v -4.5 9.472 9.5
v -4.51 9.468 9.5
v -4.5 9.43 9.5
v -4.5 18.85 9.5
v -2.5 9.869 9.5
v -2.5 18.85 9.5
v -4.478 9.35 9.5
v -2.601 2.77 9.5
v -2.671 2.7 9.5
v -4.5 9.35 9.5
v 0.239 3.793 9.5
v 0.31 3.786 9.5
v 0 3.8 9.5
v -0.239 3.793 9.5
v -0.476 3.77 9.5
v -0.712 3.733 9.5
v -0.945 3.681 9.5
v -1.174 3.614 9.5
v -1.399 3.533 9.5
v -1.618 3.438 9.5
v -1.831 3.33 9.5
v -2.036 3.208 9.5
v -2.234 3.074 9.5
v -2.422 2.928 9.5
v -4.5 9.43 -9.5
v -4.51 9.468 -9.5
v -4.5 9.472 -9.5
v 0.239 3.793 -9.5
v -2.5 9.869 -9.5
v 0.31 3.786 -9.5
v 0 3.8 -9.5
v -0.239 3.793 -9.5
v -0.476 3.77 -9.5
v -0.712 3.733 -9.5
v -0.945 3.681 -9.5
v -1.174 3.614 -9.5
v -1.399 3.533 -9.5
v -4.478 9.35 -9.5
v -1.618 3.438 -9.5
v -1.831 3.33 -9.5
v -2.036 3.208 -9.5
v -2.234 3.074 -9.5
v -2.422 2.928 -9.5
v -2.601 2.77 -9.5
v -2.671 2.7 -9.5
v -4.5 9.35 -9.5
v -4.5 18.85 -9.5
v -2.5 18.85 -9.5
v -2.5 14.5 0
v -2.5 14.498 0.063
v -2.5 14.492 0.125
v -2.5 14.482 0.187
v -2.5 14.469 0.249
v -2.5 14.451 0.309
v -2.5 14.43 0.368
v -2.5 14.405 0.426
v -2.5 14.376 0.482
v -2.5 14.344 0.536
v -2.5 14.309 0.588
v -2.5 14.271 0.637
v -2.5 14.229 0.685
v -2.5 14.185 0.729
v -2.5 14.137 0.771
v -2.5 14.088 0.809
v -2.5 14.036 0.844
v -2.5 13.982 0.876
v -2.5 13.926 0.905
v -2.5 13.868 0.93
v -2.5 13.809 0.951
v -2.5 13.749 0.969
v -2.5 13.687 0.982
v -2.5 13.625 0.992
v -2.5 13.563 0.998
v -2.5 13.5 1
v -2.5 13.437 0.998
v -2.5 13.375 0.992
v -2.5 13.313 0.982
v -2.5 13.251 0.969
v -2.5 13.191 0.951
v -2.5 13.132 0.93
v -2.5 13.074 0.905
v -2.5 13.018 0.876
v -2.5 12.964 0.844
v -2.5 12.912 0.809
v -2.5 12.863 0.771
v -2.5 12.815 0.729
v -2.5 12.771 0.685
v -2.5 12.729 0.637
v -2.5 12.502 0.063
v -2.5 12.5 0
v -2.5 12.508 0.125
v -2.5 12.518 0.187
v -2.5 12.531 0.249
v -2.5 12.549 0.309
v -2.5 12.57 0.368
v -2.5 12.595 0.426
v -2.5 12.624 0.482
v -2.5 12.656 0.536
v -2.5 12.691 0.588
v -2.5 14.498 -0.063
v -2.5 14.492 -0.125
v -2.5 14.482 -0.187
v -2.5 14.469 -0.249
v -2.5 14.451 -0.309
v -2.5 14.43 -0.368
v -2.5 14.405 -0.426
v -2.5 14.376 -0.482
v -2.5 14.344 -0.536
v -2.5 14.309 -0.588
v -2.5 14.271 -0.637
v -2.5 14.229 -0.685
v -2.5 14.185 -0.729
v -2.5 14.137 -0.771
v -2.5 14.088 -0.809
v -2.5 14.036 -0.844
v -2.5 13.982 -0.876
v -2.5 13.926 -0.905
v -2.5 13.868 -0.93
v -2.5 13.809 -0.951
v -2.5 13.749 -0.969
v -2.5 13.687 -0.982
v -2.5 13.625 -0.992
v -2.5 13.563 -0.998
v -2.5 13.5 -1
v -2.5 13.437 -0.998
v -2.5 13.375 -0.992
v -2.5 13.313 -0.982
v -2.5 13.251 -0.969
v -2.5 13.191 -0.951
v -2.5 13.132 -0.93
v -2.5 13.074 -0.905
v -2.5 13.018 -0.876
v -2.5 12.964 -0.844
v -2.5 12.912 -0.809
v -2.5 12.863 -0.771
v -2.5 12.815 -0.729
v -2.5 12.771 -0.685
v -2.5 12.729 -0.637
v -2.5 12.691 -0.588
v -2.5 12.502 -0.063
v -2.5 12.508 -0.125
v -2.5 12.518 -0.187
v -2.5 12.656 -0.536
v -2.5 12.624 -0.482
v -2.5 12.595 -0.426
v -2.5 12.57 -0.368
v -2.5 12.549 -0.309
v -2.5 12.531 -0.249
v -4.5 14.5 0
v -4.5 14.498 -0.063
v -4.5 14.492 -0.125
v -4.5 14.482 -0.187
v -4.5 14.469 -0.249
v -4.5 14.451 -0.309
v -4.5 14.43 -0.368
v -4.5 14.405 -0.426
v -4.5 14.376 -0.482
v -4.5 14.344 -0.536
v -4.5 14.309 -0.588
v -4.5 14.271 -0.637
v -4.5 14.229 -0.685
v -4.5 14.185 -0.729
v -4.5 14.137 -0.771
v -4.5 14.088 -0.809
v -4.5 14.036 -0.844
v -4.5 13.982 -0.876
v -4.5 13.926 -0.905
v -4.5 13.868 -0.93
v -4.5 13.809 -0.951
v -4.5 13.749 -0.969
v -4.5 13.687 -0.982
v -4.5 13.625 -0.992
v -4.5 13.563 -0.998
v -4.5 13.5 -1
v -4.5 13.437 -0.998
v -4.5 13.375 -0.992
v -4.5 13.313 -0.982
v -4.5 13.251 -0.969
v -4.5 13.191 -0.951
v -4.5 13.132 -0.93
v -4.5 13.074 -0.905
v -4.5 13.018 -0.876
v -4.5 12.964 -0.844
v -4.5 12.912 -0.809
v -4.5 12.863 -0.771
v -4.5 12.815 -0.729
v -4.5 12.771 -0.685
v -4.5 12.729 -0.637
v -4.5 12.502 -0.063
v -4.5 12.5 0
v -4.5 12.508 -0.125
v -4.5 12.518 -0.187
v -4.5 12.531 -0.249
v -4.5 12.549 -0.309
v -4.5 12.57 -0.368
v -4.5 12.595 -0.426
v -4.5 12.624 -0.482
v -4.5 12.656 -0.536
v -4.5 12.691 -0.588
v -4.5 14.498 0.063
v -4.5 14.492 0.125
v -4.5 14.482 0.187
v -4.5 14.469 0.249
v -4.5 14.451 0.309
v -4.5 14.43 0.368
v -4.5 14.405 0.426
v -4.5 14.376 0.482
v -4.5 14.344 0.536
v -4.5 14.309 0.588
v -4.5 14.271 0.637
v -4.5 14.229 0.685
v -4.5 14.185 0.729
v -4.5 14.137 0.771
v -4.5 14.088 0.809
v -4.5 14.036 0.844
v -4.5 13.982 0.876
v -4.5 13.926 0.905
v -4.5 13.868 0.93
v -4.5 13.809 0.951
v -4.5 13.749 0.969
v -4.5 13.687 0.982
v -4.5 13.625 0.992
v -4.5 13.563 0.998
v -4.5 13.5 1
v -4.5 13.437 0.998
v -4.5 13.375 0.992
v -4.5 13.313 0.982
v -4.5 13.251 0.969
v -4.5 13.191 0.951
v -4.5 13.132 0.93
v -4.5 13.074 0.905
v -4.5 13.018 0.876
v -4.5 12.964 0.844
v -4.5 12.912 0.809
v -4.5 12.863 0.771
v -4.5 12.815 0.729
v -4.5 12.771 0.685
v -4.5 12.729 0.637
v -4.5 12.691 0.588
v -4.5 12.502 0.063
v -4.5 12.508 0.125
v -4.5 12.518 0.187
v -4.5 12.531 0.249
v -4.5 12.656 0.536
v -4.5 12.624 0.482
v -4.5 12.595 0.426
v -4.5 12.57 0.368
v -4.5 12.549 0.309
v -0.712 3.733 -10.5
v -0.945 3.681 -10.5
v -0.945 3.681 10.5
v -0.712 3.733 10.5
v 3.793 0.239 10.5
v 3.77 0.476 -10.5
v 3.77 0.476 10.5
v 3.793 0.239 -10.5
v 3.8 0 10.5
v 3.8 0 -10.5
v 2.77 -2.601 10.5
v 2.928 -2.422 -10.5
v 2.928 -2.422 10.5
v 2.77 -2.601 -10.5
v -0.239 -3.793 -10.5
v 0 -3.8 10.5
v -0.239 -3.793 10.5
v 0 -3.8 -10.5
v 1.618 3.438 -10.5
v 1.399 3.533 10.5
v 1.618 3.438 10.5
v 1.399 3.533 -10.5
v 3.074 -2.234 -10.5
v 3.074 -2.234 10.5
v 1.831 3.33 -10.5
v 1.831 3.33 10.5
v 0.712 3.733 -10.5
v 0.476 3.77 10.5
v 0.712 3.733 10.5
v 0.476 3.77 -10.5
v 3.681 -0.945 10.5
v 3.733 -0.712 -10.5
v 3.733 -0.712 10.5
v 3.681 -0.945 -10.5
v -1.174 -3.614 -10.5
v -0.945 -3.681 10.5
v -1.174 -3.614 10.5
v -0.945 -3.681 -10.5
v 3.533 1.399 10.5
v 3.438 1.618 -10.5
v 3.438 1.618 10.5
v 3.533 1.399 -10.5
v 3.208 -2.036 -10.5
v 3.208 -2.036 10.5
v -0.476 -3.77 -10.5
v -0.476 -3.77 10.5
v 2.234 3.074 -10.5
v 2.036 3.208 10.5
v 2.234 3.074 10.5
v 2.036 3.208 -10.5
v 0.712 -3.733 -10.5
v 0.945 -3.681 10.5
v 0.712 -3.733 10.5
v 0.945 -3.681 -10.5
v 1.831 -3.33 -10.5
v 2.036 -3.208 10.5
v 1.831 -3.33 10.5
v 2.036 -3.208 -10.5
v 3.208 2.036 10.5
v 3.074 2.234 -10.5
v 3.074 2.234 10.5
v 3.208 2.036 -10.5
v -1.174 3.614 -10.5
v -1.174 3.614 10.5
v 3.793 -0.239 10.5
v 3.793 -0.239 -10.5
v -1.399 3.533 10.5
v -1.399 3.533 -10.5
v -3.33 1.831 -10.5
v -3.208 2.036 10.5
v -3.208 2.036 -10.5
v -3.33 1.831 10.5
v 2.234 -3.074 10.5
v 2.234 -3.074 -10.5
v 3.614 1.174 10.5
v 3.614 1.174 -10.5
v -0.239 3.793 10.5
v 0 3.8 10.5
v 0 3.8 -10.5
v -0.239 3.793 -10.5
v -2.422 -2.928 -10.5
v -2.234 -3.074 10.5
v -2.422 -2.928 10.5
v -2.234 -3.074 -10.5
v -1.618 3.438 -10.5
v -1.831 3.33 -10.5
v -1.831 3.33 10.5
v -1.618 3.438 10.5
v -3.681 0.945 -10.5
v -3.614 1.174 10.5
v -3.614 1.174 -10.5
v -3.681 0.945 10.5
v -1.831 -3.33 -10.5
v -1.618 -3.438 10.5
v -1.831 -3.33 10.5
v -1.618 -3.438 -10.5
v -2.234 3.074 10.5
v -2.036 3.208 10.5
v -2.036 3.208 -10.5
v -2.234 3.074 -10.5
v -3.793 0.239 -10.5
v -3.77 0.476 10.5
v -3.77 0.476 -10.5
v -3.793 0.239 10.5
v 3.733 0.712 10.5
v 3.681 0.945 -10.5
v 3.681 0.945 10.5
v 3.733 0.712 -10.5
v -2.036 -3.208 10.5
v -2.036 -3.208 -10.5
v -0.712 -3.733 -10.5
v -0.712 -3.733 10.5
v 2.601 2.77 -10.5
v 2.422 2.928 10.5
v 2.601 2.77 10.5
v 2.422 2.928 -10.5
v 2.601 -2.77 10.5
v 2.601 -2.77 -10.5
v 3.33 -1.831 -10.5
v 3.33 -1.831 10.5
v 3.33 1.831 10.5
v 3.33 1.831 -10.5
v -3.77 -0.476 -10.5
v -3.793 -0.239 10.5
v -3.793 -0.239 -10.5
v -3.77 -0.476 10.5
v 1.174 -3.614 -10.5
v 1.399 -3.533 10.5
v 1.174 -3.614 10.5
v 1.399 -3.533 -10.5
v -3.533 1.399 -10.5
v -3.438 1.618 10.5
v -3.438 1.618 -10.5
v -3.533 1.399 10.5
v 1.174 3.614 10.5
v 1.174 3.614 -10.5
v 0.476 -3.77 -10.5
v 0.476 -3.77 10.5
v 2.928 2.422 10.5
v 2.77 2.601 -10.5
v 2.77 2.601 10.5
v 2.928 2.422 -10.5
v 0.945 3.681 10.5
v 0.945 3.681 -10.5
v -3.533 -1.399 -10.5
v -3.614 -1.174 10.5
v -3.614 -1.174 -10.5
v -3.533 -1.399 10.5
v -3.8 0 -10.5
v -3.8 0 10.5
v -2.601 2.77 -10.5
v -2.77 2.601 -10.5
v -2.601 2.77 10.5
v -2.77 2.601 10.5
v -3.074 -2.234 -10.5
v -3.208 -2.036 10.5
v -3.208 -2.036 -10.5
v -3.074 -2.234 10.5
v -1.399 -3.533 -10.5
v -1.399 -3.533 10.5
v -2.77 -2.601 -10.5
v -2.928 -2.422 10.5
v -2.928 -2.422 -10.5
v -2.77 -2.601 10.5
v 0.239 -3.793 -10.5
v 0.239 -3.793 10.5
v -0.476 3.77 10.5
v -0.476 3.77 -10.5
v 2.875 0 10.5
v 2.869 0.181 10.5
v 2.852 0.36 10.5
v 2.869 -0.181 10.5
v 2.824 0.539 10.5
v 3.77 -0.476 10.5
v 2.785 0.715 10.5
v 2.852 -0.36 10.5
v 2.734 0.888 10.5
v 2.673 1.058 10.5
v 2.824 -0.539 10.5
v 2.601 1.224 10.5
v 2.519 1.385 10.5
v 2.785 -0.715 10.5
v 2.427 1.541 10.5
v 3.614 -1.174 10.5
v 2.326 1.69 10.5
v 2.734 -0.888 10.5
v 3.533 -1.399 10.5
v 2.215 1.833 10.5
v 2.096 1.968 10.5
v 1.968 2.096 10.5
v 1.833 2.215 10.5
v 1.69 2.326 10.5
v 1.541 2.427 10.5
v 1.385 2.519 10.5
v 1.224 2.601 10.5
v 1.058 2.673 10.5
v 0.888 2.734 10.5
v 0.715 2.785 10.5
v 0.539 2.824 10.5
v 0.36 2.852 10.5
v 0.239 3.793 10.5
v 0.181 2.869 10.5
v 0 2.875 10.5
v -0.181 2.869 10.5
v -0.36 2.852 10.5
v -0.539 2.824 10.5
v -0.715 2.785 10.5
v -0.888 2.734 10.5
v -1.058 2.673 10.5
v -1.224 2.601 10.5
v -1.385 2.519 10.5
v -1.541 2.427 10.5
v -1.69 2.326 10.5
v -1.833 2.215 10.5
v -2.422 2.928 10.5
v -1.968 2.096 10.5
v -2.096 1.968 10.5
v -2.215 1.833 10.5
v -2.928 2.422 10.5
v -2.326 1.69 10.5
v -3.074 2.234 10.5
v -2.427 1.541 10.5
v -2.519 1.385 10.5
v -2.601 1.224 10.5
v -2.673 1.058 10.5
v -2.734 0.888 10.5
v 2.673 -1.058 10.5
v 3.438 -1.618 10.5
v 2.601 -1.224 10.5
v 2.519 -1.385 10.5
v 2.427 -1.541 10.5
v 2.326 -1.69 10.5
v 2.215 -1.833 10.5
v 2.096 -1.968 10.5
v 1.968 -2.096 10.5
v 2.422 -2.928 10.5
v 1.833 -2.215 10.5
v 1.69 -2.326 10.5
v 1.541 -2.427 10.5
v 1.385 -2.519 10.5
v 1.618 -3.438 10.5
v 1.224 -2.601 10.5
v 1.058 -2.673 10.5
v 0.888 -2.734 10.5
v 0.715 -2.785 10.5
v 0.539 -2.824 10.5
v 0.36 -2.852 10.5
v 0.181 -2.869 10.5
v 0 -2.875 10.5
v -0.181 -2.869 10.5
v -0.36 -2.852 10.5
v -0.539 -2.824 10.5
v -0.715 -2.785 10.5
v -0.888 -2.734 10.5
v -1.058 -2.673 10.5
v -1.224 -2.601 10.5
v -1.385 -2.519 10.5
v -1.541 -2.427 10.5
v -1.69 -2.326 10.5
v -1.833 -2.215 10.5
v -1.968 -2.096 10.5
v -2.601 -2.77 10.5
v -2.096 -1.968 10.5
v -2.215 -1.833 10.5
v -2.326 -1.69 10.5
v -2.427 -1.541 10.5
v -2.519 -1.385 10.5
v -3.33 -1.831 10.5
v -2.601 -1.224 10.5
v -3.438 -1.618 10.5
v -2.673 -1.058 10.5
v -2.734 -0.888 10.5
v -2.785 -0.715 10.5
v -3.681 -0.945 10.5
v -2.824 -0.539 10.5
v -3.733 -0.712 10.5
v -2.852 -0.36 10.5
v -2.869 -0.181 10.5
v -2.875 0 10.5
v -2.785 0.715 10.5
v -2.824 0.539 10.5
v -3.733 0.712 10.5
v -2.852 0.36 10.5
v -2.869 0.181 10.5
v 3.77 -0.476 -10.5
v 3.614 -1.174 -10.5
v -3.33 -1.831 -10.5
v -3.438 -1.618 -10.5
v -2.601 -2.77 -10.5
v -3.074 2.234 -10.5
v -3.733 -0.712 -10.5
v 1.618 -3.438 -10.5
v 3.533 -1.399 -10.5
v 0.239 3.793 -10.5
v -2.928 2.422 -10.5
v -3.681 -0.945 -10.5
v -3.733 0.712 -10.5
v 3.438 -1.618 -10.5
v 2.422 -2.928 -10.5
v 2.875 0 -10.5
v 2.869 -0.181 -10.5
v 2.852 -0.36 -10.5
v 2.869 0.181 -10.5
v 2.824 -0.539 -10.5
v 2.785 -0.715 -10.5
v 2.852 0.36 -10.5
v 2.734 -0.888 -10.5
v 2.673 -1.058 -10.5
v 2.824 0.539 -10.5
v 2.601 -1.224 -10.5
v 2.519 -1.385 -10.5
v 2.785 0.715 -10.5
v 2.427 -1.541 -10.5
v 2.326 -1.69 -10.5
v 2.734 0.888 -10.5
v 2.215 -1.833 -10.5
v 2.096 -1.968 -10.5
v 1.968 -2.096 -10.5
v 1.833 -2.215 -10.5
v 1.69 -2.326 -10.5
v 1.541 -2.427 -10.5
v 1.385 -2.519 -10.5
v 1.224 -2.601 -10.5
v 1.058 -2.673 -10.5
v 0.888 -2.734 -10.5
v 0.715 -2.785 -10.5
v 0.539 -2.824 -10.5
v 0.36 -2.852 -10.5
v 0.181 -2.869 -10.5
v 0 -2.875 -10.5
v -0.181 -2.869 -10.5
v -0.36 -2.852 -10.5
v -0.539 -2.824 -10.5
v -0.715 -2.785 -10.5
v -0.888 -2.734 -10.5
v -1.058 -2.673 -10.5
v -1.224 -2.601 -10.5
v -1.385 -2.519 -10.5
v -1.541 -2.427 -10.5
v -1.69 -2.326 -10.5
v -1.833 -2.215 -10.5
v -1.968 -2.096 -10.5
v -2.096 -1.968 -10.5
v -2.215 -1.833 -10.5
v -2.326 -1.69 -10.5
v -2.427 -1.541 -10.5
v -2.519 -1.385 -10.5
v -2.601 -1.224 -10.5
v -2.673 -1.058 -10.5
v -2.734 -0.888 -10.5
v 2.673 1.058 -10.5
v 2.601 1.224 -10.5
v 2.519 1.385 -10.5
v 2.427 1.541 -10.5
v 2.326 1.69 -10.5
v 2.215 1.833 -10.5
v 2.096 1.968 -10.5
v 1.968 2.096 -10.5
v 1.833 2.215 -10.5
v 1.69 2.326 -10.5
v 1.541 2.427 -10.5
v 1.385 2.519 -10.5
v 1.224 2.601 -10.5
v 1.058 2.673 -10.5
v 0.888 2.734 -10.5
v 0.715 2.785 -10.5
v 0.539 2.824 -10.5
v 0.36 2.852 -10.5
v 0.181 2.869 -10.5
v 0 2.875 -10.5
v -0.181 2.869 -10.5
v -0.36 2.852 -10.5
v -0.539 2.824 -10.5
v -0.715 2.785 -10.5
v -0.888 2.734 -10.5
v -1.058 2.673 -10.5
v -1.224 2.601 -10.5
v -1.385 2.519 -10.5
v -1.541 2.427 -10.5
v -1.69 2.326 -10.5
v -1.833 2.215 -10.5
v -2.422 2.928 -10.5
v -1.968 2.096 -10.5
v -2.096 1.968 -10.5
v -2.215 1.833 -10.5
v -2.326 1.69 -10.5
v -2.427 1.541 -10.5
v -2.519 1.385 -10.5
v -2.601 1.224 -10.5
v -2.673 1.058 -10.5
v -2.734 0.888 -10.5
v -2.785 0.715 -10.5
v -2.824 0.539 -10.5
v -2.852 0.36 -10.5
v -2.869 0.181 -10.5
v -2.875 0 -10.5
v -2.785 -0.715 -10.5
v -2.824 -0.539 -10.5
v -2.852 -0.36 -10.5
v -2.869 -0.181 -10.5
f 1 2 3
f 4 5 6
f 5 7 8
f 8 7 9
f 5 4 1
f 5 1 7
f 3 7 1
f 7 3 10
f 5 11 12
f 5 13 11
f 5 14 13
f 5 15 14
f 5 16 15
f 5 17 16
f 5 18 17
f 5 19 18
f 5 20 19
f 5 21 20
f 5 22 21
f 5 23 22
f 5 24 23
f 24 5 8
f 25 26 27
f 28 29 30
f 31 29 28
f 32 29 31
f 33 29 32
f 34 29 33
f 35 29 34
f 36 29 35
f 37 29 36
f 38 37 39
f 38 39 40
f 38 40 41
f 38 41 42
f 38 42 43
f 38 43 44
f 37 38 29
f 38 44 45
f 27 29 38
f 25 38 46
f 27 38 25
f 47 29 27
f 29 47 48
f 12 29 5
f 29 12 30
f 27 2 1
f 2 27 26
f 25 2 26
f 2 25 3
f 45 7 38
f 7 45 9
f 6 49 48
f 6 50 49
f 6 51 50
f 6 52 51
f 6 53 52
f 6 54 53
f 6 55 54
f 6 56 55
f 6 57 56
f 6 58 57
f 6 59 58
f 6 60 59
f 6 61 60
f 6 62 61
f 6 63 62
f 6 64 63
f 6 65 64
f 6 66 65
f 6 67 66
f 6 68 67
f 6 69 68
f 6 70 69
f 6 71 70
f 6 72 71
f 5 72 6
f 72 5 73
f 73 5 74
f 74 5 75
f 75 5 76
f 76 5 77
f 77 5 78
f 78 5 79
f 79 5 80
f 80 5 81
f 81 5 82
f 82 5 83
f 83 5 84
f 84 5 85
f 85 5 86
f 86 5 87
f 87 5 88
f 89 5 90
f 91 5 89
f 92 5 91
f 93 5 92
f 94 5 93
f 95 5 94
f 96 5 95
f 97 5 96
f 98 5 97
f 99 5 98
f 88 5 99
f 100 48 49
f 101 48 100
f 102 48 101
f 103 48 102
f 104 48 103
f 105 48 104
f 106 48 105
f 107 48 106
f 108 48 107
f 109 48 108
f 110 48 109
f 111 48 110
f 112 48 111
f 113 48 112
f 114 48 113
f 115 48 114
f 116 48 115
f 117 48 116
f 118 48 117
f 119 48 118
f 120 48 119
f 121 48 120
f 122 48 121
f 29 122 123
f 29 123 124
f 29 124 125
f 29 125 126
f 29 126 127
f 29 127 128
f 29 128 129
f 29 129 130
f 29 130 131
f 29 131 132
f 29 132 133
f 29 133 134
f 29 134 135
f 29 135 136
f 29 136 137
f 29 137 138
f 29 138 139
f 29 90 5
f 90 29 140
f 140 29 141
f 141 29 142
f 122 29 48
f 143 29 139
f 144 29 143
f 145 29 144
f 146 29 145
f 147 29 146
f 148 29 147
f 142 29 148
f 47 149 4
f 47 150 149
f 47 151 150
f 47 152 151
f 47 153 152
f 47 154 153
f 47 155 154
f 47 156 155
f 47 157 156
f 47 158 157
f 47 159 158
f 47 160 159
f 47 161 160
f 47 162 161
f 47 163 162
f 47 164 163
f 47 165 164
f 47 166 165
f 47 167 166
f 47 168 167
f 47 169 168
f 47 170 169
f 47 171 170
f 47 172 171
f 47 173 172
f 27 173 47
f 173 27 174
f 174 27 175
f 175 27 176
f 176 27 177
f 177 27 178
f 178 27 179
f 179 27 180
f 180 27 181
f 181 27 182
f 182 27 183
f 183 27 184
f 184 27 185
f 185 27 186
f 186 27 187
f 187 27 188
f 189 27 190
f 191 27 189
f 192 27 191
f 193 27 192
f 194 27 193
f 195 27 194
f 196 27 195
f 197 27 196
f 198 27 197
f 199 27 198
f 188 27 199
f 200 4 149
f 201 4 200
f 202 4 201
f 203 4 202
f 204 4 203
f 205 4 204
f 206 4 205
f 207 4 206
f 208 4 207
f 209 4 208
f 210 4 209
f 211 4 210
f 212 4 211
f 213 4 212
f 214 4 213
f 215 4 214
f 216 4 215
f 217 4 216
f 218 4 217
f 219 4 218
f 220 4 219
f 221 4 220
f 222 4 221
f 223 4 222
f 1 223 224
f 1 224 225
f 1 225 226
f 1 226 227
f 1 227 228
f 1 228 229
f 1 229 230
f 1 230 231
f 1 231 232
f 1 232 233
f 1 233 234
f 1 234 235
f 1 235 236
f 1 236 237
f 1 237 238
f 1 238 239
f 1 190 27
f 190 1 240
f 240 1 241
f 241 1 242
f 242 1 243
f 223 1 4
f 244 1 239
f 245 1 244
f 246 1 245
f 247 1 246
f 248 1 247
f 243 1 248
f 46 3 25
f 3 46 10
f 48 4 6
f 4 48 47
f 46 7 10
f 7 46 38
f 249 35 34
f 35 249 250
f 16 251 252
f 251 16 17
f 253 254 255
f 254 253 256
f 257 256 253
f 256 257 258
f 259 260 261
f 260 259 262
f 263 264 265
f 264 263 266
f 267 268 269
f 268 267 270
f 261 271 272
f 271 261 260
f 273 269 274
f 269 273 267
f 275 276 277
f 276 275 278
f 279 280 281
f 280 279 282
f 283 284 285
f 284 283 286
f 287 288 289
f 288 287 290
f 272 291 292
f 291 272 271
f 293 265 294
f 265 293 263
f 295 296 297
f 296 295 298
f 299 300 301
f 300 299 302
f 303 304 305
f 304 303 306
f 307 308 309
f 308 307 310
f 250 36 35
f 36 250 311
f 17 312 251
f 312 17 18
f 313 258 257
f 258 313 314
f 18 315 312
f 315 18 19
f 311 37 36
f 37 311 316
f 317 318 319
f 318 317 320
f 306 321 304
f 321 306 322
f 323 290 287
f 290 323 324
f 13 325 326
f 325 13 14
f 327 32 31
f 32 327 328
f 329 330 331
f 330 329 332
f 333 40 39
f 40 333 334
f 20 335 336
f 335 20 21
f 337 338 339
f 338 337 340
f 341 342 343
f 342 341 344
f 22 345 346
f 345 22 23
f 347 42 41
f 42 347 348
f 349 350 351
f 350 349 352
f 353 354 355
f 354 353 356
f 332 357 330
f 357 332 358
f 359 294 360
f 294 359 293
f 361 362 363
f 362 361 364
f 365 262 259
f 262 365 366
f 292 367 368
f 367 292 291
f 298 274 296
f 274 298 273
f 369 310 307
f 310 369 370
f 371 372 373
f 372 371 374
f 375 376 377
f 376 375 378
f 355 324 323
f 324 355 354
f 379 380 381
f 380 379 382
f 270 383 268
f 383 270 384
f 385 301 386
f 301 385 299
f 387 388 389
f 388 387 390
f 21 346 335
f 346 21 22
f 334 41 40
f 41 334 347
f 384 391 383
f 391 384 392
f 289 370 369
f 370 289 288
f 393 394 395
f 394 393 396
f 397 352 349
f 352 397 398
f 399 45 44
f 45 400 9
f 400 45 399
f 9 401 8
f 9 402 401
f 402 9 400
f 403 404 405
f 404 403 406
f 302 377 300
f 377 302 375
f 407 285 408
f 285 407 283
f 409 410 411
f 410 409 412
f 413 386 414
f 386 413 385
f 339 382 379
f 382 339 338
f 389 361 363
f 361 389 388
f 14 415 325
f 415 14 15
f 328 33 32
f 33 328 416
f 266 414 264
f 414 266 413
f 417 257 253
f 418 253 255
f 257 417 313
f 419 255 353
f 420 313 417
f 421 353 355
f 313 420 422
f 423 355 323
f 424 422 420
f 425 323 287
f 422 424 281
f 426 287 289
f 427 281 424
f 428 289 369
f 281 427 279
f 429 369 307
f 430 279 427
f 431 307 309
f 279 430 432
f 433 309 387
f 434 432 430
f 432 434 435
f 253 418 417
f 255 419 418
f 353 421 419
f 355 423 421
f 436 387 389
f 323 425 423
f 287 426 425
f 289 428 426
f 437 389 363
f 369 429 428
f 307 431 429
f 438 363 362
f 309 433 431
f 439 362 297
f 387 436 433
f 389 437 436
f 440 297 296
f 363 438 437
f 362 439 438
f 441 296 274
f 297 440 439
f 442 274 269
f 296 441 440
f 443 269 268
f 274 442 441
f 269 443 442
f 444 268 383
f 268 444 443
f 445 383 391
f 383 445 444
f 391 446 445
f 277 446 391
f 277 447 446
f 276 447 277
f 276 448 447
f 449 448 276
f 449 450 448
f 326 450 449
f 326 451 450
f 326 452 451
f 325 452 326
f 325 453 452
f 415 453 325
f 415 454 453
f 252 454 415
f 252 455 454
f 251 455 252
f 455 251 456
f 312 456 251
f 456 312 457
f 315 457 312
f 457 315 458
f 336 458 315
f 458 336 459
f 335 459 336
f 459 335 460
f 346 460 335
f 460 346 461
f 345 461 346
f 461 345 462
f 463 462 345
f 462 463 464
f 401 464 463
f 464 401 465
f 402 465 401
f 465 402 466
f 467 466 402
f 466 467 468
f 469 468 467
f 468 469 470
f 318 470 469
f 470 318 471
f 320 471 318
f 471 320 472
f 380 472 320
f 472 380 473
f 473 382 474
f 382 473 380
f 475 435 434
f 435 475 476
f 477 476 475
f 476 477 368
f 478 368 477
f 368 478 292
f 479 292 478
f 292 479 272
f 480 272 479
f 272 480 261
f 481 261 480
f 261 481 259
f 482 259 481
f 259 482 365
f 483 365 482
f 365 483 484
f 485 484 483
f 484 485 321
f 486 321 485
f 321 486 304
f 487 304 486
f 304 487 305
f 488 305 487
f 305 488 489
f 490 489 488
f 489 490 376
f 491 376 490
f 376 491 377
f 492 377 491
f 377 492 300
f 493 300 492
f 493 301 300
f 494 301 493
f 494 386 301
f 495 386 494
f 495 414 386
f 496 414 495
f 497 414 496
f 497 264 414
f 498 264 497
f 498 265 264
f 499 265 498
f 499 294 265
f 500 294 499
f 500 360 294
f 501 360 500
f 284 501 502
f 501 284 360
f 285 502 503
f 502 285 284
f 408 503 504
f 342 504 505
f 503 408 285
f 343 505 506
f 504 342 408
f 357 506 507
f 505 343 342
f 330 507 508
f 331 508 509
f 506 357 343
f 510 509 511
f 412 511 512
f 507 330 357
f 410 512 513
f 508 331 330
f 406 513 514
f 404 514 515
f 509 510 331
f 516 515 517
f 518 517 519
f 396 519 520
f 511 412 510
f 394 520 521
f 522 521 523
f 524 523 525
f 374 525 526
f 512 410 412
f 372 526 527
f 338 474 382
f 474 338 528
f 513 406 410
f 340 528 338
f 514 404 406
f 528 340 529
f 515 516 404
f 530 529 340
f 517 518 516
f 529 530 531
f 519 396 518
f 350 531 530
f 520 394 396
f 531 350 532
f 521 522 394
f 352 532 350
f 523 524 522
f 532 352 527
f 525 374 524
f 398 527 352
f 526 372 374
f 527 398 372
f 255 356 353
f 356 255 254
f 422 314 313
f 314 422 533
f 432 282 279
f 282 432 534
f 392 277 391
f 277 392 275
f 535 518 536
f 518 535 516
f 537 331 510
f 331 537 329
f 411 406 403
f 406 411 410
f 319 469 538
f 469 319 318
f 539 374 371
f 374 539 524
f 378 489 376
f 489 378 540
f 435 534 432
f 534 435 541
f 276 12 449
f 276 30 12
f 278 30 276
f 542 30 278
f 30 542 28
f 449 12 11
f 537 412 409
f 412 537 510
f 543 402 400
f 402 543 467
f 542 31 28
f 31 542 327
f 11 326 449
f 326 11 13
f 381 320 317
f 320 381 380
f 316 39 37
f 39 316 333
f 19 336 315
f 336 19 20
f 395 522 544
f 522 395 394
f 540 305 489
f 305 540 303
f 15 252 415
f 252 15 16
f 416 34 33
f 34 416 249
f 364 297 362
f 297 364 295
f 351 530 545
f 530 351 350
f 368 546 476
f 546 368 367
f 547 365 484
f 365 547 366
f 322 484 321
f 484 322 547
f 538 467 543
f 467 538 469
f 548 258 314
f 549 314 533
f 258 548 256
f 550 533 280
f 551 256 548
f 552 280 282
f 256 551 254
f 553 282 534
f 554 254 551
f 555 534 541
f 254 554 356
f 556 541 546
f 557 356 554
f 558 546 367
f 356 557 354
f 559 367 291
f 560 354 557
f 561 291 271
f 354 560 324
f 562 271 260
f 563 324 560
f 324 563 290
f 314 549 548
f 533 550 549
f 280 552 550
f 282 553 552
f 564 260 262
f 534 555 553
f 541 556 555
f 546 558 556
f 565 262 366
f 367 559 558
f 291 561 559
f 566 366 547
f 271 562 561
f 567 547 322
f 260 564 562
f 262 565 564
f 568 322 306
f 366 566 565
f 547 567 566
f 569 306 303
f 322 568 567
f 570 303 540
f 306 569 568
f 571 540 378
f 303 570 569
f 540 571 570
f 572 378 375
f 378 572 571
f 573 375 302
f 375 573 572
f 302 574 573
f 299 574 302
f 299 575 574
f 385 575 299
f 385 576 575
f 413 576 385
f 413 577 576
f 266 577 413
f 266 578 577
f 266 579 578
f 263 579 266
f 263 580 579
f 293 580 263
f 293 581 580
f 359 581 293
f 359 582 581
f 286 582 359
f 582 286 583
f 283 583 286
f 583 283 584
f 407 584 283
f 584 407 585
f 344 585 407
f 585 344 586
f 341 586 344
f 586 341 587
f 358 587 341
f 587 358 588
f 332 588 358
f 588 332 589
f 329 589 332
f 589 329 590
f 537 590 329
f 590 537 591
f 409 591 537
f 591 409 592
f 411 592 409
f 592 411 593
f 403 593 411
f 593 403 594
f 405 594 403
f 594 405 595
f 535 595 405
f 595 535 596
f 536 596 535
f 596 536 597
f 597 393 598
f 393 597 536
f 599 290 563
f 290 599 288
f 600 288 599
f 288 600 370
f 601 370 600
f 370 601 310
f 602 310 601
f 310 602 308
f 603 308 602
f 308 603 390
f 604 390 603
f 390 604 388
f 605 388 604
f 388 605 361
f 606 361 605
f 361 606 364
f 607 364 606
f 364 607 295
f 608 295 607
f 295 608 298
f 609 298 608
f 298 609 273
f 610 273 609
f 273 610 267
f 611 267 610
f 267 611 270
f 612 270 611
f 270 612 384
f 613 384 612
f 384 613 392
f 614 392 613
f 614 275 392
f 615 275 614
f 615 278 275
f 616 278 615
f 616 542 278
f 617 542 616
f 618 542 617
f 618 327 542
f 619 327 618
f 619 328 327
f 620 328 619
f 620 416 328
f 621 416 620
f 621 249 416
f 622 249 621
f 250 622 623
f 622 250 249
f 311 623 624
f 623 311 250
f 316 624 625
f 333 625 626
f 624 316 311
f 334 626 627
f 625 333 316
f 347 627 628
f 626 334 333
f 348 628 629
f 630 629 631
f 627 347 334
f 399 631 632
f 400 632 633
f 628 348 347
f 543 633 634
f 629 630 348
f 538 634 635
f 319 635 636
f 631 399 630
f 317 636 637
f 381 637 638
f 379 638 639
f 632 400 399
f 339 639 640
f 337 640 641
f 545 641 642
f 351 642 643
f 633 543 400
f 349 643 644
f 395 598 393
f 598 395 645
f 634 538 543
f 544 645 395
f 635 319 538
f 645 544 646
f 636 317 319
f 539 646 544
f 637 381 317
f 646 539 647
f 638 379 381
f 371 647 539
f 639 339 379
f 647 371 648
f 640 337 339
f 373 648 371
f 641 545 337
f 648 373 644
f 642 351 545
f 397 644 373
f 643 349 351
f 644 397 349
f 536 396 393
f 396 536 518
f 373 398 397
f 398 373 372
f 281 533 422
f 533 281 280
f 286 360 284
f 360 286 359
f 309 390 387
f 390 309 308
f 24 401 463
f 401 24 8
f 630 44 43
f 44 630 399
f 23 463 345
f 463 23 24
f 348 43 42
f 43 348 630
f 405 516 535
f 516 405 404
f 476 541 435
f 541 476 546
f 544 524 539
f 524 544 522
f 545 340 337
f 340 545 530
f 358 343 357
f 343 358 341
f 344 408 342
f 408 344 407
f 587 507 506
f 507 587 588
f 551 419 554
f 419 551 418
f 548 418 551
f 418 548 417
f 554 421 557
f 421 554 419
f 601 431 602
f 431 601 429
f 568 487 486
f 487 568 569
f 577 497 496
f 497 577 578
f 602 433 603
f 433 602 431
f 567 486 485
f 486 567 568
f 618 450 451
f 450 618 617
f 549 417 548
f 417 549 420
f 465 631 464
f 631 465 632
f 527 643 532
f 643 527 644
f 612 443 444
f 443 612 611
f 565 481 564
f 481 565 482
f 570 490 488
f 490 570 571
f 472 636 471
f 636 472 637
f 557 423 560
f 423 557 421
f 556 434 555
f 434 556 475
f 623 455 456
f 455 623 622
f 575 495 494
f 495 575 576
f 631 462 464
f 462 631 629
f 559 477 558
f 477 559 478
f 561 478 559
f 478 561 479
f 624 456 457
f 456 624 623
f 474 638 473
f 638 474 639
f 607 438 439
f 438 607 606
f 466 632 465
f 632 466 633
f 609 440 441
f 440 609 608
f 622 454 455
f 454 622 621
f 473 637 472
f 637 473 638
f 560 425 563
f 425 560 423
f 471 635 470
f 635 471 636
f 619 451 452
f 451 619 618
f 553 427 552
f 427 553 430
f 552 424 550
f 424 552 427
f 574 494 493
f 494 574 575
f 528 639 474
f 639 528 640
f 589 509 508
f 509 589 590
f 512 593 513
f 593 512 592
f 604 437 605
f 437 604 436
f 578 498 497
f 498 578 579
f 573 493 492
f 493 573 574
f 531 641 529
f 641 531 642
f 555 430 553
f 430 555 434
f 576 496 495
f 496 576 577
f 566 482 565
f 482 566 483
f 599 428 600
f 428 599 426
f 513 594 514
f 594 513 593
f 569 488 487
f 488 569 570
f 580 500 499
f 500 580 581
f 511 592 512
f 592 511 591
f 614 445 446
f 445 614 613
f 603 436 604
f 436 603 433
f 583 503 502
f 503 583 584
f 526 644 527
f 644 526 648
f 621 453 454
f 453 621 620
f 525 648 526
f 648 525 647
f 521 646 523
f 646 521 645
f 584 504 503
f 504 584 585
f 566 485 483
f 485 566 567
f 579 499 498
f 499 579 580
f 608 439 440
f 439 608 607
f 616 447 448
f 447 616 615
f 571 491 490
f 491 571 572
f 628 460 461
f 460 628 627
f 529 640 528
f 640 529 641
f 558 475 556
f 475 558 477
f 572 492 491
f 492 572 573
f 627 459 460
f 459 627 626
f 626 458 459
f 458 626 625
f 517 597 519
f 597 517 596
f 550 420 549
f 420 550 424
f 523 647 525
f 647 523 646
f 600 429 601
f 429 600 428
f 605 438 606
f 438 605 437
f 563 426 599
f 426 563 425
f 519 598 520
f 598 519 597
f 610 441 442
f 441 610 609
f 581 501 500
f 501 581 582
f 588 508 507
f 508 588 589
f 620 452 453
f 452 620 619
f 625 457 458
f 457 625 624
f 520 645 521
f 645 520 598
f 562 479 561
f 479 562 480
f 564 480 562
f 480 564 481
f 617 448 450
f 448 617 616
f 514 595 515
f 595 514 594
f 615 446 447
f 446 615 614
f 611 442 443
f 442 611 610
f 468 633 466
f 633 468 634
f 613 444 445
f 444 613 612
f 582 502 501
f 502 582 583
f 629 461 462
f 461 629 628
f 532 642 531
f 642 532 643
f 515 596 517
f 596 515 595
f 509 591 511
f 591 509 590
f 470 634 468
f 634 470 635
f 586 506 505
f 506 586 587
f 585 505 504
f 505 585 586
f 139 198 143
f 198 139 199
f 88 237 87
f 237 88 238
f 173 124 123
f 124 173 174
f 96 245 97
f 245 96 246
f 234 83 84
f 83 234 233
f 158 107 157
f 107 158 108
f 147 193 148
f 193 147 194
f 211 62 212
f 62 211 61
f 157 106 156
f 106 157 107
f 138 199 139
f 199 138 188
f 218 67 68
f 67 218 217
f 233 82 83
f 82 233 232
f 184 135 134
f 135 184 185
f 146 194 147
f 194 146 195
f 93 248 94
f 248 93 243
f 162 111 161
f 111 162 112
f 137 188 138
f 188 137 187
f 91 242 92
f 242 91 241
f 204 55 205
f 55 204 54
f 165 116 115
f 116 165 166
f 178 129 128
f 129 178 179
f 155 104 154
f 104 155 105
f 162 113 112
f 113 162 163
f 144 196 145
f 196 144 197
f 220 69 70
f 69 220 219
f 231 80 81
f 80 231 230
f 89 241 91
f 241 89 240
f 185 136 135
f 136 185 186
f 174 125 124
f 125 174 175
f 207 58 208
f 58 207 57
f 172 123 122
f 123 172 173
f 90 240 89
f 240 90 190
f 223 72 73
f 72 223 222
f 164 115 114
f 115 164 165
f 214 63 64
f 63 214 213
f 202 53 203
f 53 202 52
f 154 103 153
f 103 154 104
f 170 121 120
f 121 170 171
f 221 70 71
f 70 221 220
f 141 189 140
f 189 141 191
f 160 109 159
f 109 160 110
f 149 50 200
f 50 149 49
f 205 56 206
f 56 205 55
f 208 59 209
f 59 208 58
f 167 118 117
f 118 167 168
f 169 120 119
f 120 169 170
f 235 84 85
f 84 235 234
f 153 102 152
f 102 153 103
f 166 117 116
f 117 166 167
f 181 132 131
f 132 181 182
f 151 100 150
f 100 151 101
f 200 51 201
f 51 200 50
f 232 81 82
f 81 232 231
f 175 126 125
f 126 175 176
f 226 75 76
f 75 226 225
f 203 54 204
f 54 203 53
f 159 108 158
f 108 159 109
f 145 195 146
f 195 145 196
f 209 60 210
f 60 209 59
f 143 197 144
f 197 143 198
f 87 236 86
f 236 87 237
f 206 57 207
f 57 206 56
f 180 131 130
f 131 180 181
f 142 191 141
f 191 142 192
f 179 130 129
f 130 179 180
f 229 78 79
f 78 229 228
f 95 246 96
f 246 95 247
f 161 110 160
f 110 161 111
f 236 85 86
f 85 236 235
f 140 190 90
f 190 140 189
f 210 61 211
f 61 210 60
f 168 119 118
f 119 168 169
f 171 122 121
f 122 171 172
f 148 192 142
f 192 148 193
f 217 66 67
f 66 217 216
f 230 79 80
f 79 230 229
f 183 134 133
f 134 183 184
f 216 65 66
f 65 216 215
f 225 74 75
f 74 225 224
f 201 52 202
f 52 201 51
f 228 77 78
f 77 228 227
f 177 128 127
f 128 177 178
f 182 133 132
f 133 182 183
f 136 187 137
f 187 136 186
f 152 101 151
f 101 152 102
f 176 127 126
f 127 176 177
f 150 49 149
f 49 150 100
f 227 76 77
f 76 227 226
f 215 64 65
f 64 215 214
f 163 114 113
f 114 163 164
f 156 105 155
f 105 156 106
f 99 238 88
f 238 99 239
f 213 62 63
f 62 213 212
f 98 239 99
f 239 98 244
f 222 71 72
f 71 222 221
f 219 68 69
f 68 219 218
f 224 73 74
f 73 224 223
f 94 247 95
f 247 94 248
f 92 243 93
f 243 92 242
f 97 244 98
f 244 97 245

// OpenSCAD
// file: trapeze.scad
module trapeze(base, top, height, lentgth) {
    linear_extrude(height = height, center=true)
        hull() {
            square([base,0.0001], center=true);
            mv(0,lentgth,0)
                square([top,0.0001], center=true);
        }
}
// file: hexagone.scad
function cot(x)=1/tan(x);

module Hexagone(cle,h)
{
	angle = 360/6;		// 6 pans
	cote = cle * cot(angle);
	echo(angle, cot(angle), cote);
	echo(acos(.6));

	union()
	{
		rotate([0,0,0])
			cube([cle,cote,h],center=true);
		rotate([0,0,angle])
			cube([cle,cote,h],center=true);
		rotate([0,0,2*angle])
			cube([cle,cote,h],center=true);
	}
}
// file: utils.scad
module part(name) {
    echo(PART);
    if (PART == undef || PART == name) {
        children([0 : $children -1]);
    }
    else {
        %children([0 : $children -1]);
    }
}

module mv(x, y, z) {
    translate([x,y,z]) {
        children([0 : $children -1]);

   }
}

module rot(x, y, z) {
    rotate([x,y,z]) {
        children([0 : $children -1]);
   }
}

module trans() {
    %children();
}

module hash() {
    #children();
}

module fidt() {
    children(0);
    difference() {
        trans()
        children(1);
        hash()
        children(0);
   }
}

module fid() {
    difference() {
        children(1);
        children(0);
   }
}

module dif() {
    difference() {
        children(0);
        children(1);
   }
}

module dift() {
    children(1);
    difference() {
        trans()
        children(0);
        hash()
        children(1);
   }
}

module mirx() {
    children(0);
    mirror([1,0,0]) {
        children(0);
   }
}

module miry() {
    children(0);
    mirror([0,1,0]) {
        children(0);
   }
}

module mirz() {
    children(0);
    mirror([0,0,1]) {
        children(0);
   }
}
// main file
include<utils.scad>
include<hexagone.scad>
include<trapeze.scad>

$fn=100;
in=2.8;
out=5.85;
h=30;

camera_screw_diam=2;
camera_depth=15.5;
camera_spacing=19;
camera_holder_height=19;
spacer_dist=28;
camera_holder_length=19;
side_length=camera_holder_length-8.46;
angle_both=2;

module old_cam_holder() {
dif() {
/*mirx()*/
/*mirror()*/
    union() {
        mv(spacer_dist/2,0,0) {
            rot(0,0,18+angle_both)
            mv(0,1.5,(h-camera_holder_height)/-2)
            trapeze(3.5, 2,camera_holder_height, side_length-1.6);
            /*cube([side_length,3,camera_holder_height], center=true);*/
            fid() {
                cylinder(h=h+1, d=in, center=true);
                rot(0,0,-12+angle_both)
                Hexagone(out, h);
            }
        }
        mv(camera_spacing/2+1,camera_depth-1.8,(h-camera_holder_height)/-2)
            cube([2,19/2,camera_holder_height], center=true);
    }



mv(0,camera_depth-2,0)
rot(0,90,0)
cylinder(h=100, d=camera_screw_diam,center=true);
}
}

/*old_cam_holder();*/
module alu_standoff() {
    mirz()
    mv(0,0,-(11/2+5)) {
        cylinder(h=5, d=5.60);
        mv(0,0,5)
            cylinder(h=11/2,d1=5.60,d2=4.80);
    }
}
module camera_holder_arm() {
    cylinder(h=21, d=5.60+2, center=true);
    union() {
        rot(0,0,18+angle_both)
            mv(0,1.5,0)
            trapeze(3.5, 2,camera_holder_height, side_length-1.6);
        /*cube([side_length,3,camera_holder_height], center=true);*/
        mv(-3.5,camera_depth-1.4,0)
            cube([2,19/2,camera_holder_height], center=true);
    }
}

//21 = 5 + 5 + 11

module camera_holder() {
dif() {
    camera_holder_arm();
    union() {
        cylinder(h=22, d=5.60+0.15, center=true); // standoff .15 clearence
        mv(0,camera_depth-2,0)
            rot(0,90,0)
            cylinder(h=100, d=camera_screw_diam,center=true);
    }
    /*alu_standoff();*/
}
}
/*mirx()*/
/*mv(spacer_dist/2, 0, 0)*/
camera_holder();
//v3 change space size from 4.85 to 5.85
